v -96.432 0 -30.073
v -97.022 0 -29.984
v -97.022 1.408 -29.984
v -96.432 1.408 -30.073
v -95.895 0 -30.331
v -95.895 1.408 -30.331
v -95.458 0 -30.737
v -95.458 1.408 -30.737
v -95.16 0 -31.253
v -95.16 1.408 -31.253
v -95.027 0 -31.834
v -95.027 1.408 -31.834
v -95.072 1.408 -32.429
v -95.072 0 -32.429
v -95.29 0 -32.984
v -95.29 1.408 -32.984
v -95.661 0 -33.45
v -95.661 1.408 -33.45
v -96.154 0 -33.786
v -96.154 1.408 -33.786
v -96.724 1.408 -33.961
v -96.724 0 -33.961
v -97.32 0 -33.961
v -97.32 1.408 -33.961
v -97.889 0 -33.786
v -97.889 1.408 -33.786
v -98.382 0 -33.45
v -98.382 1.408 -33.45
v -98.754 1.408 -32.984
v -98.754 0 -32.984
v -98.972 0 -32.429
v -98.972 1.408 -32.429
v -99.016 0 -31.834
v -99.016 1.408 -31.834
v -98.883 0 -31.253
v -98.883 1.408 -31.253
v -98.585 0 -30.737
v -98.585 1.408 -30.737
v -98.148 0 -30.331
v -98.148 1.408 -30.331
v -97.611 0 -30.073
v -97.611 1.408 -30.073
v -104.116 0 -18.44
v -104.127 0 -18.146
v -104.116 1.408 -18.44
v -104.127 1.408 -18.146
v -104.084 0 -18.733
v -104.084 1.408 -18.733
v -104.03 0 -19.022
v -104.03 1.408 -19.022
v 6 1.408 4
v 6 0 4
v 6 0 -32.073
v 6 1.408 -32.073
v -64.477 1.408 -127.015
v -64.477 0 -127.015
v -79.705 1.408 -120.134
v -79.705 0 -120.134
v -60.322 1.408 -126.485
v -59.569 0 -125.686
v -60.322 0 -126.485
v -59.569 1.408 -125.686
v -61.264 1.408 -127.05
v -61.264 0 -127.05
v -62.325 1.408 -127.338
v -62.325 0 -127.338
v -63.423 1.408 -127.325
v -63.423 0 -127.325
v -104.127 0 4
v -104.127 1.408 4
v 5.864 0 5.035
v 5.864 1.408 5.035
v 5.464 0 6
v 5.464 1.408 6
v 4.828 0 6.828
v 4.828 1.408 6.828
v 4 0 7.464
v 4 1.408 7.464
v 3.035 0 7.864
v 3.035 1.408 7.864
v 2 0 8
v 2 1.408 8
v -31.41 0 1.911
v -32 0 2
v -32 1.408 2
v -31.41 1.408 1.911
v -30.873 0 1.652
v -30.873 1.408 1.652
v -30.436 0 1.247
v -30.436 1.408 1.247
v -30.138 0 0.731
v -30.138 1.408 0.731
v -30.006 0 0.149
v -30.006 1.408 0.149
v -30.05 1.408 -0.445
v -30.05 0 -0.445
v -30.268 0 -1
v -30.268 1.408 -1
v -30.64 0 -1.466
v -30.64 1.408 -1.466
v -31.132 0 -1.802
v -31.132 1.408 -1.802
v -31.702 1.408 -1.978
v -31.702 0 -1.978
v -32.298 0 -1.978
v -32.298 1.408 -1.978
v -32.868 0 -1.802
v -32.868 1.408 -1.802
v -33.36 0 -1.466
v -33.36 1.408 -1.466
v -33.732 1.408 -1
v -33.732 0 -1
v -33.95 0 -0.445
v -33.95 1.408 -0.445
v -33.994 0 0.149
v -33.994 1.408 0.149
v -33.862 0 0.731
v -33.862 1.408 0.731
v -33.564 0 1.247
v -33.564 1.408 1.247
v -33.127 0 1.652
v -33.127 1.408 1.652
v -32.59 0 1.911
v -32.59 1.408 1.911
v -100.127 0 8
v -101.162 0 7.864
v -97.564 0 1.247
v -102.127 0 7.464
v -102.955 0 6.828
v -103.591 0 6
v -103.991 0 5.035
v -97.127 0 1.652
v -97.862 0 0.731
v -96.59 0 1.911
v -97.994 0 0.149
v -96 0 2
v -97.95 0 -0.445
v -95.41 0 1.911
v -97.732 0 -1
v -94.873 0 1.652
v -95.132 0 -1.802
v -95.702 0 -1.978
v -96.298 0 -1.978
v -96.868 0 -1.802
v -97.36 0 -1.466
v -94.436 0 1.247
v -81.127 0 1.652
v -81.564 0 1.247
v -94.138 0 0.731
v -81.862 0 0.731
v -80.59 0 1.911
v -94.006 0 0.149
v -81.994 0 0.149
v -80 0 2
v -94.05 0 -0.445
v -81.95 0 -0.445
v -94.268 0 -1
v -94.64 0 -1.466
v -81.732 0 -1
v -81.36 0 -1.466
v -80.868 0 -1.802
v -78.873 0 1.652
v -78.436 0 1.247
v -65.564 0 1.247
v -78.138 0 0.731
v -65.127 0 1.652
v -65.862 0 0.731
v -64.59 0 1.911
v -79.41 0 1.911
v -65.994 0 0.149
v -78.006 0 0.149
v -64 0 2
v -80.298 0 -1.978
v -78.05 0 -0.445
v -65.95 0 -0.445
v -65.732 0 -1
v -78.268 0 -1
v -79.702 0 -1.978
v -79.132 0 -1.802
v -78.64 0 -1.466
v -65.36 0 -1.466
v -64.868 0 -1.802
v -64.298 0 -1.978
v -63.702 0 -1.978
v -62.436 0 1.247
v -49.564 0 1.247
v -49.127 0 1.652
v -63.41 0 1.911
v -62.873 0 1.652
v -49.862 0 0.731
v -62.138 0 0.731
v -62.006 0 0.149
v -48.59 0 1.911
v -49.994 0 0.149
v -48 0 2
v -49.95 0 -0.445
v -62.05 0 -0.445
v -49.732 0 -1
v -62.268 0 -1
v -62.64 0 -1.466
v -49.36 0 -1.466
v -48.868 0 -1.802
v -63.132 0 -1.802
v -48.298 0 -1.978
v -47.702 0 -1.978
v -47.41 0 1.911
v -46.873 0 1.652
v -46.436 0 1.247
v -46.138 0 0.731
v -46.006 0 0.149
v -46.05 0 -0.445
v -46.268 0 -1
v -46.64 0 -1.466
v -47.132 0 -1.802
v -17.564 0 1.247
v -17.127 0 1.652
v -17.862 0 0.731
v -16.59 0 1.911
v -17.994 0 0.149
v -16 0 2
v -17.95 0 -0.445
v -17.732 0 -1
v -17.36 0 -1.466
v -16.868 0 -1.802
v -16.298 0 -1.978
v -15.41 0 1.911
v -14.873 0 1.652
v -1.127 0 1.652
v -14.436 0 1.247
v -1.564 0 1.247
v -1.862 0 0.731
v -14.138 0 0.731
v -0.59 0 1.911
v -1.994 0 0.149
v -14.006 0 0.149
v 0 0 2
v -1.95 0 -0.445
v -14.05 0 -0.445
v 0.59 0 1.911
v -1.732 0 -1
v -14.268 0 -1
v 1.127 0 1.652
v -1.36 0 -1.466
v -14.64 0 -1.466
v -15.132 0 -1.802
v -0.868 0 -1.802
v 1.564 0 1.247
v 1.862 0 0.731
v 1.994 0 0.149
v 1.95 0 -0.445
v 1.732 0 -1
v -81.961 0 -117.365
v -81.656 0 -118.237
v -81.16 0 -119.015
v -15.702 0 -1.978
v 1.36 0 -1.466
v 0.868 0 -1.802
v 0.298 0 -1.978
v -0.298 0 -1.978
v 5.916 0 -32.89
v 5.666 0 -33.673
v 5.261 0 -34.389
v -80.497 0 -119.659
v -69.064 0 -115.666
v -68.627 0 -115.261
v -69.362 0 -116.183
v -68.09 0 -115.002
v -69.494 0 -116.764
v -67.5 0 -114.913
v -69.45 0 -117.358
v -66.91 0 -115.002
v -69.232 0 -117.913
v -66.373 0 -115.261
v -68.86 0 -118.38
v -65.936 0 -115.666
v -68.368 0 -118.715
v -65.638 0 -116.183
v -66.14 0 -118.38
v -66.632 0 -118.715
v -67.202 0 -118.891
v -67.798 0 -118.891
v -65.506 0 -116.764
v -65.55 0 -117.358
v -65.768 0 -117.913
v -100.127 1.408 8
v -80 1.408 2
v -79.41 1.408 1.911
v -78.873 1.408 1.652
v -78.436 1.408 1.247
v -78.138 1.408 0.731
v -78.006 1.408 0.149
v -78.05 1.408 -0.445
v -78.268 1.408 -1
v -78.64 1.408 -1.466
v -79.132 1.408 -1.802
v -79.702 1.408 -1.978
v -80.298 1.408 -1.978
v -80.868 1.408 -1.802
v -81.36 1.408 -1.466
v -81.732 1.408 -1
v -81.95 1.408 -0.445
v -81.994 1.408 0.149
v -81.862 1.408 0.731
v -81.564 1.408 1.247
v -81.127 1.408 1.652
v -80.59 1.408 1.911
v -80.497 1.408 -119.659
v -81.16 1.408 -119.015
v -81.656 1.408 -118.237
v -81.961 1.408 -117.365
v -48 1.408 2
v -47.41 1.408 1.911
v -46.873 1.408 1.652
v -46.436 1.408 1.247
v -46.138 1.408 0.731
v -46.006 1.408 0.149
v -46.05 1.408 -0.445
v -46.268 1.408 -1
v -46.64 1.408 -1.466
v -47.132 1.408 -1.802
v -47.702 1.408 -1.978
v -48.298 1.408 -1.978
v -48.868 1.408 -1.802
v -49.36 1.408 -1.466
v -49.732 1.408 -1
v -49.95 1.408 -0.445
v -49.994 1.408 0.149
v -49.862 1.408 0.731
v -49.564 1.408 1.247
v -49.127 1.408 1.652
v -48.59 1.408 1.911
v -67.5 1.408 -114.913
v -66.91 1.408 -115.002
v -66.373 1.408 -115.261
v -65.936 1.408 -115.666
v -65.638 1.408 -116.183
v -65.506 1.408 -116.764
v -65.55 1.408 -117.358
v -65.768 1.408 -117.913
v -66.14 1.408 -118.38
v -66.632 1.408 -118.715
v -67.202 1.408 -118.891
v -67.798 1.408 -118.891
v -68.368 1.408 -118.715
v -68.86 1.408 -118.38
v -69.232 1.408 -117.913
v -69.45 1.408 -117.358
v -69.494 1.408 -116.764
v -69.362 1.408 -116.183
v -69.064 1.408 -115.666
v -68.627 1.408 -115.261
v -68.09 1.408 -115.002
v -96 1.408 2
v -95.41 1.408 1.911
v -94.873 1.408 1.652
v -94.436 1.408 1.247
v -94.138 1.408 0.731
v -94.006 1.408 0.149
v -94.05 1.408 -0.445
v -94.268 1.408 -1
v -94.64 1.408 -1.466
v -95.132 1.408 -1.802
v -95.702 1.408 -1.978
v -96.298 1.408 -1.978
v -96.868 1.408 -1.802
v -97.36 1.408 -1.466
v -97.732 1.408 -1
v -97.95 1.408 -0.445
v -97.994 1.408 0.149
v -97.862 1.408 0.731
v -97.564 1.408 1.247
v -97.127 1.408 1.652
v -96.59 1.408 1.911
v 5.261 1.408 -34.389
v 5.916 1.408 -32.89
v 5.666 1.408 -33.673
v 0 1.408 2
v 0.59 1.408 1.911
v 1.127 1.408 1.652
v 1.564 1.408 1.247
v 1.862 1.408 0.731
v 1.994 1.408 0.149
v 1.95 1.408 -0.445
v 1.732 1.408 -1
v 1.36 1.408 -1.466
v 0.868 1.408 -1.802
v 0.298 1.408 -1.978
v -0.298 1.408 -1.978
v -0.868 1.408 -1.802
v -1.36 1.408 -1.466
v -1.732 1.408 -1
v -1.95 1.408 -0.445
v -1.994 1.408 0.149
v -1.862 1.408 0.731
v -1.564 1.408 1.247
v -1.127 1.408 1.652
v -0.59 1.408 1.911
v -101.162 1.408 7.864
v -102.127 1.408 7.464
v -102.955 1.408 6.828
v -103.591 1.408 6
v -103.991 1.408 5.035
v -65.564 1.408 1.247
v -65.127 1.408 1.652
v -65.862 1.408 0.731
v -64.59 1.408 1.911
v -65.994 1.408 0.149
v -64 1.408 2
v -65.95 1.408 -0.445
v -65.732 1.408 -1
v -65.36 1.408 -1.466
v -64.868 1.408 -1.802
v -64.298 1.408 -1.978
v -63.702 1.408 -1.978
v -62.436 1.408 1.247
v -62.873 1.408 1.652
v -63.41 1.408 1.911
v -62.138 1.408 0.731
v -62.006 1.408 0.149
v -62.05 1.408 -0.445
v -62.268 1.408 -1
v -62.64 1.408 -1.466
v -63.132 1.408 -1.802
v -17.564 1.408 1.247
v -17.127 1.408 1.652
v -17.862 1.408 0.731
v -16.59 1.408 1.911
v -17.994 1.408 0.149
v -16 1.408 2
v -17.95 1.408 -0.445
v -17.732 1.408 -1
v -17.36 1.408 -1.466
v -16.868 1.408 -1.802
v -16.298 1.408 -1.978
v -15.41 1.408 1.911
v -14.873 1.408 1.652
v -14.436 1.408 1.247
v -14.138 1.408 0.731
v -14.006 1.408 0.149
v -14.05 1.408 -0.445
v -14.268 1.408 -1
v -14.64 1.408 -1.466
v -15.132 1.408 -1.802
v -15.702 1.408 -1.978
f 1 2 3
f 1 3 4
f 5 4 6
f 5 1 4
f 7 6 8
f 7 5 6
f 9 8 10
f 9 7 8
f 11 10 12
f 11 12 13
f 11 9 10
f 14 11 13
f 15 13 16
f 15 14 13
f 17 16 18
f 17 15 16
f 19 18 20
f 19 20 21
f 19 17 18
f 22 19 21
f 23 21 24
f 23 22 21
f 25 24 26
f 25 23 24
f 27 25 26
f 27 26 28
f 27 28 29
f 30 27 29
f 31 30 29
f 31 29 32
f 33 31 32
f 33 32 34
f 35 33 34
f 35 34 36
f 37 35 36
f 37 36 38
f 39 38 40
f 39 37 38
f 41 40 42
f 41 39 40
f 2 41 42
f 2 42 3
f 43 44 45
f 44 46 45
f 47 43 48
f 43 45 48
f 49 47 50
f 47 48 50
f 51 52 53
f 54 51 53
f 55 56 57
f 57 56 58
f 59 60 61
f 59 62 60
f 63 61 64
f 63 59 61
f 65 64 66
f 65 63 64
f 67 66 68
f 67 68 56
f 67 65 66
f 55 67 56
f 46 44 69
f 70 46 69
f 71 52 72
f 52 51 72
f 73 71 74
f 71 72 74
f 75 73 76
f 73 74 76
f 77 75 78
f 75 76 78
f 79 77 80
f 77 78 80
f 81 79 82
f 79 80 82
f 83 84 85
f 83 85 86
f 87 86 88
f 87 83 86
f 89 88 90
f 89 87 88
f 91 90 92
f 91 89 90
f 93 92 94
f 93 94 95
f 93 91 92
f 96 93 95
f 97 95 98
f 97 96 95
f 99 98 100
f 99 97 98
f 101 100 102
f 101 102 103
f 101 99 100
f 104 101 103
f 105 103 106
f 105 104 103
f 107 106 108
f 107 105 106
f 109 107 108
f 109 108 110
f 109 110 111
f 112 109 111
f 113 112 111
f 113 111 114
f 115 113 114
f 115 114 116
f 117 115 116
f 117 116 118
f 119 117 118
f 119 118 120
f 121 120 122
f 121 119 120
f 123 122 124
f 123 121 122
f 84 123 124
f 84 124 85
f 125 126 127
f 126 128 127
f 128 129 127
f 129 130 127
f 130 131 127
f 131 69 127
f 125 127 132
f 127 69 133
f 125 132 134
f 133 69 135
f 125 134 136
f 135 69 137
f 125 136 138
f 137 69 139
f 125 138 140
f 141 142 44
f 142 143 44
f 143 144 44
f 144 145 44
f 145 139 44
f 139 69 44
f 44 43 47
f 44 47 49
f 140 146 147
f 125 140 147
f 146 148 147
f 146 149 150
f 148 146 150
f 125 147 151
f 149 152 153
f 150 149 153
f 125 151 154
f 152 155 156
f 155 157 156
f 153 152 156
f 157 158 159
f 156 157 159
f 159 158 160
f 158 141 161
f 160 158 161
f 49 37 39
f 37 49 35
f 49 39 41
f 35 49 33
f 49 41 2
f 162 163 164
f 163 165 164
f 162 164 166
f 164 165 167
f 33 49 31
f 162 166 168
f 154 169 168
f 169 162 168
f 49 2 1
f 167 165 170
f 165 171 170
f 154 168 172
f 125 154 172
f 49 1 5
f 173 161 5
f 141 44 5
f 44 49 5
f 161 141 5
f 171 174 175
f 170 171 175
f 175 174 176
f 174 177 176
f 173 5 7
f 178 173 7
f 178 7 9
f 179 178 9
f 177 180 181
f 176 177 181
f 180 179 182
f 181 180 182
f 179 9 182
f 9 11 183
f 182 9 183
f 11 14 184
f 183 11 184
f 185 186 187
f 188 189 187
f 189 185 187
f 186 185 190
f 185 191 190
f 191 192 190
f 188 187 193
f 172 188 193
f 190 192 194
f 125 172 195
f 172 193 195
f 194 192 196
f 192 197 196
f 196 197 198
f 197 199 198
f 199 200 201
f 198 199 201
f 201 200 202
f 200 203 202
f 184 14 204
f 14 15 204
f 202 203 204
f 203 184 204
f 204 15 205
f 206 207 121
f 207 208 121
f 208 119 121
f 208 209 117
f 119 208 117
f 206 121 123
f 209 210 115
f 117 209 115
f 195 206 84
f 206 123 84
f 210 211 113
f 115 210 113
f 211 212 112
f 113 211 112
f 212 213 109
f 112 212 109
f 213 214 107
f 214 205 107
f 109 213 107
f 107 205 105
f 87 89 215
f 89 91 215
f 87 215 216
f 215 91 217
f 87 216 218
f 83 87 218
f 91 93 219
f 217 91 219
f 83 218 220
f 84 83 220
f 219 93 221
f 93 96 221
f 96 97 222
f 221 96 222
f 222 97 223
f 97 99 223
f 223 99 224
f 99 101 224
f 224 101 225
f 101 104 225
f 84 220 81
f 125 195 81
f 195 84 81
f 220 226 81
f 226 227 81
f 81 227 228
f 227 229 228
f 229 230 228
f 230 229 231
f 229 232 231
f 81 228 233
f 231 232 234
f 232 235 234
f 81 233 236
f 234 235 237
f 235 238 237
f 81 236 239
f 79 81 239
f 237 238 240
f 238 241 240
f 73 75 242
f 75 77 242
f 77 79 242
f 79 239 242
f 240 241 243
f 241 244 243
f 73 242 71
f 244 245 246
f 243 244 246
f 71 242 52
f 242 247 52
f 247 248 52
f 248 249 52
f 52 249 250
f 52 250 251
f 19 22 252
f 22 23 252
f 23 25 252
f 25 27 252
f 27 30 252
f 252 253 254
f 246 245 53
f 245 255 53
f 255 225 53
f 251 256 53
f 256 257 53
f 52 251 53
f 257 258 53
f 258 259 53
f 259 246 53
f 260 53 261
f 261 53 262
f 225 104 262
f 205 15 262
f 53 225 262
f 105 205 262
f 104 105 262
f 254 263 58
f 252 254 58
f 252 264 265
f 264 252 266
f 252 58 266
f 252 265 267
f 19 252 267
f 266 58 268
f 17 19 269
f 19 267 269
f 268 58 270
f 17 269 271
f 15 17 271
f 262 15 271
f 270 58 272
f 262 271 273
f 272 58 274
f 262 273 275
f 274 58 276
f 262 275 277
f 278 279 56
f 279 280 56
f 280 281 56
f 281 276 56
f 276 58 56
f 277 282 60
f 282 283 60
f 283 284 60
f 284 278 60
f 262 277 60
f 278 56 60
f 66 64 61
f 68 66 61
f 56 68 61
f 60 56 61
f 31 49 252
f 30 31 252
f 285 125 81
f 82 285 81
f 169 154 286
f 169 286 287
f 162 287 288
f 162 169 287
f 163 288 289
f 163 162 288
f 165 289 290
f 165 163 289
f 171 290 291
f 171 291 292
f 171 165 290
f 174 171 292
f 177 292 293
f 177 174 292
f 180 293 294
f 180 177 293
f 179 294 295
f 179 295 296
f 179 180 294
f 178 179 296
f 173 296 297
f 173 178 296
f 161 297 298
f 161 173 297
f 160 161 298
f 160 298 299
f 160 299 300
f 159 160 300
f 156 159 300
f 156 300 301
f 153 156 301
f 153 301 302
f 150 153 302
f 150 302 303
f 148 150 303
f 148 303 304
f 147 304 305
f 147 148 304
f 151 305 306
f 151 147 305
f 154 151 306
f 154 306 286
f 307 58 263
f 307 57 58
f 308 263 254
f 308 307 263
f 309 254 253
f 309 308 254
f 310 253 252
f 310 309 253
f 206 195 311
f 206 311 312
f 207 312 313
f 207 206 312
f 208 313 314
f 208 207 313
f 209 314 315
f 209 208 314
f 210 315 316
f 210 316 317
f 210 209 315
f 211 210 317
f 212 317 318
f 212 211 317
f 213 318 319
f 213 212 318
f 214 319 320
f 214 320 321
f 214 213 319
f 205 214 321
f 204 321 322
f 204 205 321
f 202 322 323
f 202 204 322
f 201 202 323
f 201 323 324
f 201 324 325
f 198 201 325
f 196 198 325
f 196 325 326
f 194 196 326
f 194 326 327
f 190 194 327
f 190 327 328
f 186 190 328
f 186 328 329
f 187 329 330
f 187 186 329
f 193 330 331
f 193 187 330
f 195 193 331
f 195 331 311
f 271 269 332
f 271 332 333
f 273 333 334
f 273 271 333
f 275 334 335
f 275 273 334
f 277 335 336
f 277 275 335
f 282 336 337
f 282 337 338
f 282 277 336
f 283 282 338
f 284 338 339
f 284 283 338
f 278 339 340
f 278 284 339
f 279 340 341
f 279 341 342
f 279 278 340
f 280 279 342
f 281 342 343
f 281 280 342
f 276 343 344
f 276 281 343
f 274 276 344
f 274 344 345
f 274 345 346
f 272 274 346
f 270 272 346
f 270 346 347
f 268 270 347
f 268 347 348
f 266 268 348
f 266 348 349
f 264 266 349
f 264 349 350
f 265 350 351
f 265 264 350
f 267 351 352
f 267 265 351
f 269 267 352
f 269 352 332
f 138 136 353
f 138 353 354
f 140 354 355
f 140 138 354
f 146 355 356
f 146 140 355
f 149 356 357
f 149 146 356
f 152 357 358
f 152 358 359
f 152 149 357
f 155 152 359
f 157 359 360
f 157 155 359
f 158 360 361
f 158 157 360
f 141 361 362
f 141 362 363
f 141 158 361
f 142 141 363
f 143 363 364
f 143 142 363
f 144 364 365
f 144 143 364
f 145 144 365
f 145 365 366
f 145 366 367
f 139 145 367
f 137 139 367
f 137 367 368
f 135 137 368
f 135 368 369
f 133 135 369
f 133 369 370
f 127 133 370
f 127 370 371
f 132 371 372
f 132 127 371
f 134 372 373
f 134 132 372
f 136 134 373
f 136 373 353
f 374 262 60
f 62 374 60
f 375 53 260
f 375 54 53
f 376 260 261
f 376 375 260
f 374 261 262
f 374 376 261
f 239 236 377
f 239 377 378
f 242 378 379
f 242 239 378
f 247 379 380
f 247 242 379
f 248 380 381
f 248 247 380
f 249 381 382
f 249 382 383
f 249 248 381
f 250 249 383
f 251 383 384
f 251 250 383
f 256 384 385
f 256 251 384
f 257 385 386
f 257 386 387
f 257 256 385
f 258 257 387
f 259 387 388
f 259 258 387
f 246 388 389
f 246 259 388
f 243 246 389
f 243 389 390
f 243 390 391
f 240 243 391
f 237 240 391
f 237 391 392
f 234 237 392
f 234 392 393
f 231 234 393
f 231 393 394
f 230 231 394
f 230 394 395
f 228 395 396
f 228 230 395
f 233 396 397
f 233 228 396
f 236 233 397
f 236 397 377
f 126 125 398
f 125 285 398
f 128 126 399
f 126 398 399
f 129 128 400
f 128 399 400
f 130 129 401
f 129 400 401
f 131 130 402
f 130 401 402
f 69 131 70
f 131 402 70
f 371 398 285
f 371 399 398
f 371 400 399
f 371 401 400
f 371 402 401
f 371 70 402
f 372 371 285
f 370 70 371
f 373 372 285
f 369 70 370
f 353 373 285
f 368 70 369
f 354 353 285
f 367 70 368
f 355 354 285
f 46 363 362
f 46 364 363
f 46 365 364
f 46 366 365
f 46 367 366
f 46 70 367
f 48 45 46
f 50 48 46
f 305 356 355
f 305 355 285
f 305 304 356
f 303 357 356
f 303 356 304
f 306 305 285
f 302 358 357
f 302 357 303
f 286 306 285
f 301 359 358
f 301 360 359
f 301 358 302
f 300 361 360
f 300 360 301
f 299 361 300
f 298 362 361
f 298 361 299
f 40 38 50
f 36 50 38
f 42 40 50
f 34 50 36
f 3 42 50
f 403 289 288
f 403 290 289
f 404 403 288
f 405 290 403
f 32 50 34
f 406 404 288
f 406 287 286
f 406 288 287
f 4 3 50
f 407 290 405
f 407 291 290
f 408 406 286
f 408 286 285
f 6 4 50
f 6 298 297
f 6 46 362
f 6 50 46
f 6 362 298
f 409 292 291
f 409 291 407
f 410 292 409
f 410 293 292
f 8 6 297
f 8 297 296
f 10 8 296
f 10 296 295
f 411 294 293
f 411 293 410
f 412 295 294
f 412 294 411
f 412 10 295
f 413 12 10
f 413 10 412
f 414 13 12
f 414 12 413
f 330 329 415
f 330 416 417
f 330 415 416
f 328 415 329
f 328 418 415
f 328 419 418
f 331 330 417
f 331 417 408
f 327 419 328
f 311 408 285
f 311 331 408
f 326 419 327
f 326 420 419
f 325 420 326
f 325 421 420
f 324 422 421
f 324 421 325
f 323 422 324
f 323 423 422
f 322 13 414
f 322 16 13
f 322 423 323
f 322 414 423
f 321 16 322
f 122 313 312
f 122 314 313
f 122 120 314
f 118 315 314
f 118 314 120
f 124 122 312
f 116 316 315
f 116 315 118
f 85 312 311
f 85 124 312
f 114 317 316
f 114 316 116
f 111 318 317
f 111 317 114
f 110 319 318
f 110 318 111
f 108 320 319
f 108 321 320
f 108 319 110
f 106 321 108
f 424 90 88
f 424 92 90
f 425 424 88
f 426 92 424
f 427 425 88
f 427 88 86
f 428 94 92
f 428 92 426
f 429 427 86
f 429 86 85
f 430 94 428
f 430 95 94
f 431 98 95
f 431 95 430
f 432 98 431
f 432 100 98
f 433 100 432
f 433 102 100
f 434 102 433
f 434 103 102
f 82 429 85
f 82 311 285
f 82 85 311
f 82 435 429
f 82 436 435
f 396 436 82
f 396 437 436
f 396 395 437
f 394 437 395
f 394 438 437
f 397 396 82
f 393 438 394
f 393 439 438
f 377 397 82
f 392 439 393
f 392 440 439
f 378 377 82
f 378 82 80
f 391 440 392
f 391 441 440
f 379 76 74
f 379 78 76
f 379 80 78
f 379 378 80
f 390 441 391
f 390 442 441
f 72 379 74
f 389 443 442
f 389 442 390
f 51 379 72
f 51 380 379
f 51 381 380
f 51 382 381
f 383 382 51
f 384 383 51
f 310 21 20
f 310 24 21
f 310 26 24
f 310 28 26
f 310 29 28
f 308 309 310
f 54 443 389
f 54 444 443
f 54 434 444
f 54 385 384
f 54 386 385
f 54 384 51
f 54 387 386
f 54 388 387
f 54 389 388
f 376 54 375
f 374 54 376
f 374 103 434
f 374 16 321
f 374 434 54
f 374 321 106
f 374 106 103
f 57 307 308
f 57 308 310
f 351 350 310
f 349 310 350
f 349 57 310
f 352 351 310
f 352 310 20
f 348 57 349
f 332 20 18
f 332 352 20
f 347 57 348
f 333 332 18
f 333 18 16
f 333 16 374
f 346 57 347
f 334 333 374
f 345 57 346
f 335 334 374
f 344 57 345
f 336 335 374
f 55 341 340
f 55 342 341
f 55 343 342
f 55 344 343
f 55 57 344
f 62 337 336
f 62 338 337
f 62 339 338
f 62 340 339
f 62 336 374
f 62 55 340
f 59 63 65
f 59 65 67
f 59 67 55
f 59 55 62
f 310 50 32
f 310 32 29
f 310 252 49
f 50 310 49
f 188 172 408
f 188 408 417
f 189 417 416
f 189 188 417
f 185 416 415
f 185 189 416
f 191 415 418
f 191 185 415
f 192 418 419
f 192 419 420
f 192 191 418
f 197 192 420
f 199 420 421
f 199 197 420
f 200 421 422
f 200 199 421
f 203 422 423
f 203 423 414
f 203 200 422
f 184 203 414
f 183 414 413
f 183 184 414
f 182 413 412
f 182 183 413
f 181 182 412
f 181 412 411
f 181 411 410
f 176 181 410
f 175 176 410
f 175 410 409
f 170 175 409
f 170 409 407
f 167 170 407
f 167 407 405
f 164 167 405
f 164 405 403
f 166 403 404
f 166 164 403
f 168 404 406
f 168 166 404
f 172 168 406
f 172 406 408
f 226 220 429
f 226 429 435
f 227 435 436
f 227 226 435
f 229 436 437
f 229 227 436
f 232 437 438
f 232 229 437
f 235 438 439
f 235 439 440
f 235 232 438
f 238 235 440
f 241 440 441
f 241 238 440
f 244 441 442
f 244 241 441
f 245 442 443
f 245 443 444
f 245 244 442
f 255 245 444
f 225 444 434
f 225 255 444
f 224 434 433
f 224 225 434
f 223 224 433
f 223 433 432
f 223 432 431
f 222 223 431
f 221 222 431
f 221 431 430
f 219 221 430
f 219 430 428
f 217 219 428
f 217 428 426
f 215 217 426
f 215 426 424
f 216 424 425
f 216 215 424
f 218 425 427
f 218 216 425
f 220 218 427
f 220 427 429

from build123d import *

# Parameters (mm, degrees)
SKETCH1_R           = 2
BOSS_EXTRUDE1_DEPTH = 1.4077243
FILLET2_R           = 4


with BuildPart() as part:
    # Sketch1 → Boss-Extrude1 (new body)
    with BuildSketch(Plane(origin=(0, 0, 0), x_dir=(1, 0, 0), z_dir=(0, 1, 0))):
        Polygon((6, -8), (6, 33.34843691), (-61.475760907, 128.370940703), (-81.524239093, 119.312324779), (-104.126855641, 18.58956294), (-104.126855641, -8), align=None)
        with Locations(Location((-96, 0, 0), (0, 0, 270))):
            Circle(SKETCH1_R, mode=Mode.SUBTRACT)
        with Locations(Location((-80, 0, 0), (0, 0, 270))):
            Circle(SKETCH1_R, mode=Mode.SUBTRACT)
        with Locations(Location((-64, 0, 0), (0, 0, 270))):
            Circle(SKETCH1_R, mode=Mode.SUBTRACT)
        with Locations(Location((-97.021679837, 31.983686003, 0), (0, 0, 270))):
            Circle(SKETCH1_R, mode=Mode.SUBTRACT)
        with Locations(Location((-48, 0, 0), (0, 0, 270))):
            Circle(SKETCH1_R, mode=Mode.SUBTRACT)
        with Locations(Location((-32, 0, 0), (0, 0, 270))):
            Circle(SKETCH1_R, mode=Mode.SUBTRACT)
        with Locations(Location((-16, 0, 0), (0, 0, 270))):
            Circle(SKETCH1_R, mode=Mode.SUBTRACT)
        with Locations(Location((0, 0, 0), (0, 0, 270))):
            Circle(SKETCH1_R, mode=Mode.SUBTRACT)
        with Locations(Location((-67.5, 116.913429511, 0), (0, 0, 270))):
            Circle(SKETCH1_R, mode=Mode.SUBTRACT)
    extrude(amount=BOSS_EXTRUDE1_DEPTH)

    # Fillet2
    fillet2_edges = [part.edges().sort_by_distance(p)[0] for p in [
        (6, 0.70386215, 8),
        (-104.126855641, 0.70386215, 8),
        (-104.126855641, 0.70386215, -18.58956294),
        (-81.524239093, 0.70386215, -119.312324779),
        (-61.475760907, 0.70386215, -128.370940703),
        (6, 0.70386215, -33.34843691),
    ]]
    fillet(fillet2_edges, radius=FILLET2_R)


solid = part.part
